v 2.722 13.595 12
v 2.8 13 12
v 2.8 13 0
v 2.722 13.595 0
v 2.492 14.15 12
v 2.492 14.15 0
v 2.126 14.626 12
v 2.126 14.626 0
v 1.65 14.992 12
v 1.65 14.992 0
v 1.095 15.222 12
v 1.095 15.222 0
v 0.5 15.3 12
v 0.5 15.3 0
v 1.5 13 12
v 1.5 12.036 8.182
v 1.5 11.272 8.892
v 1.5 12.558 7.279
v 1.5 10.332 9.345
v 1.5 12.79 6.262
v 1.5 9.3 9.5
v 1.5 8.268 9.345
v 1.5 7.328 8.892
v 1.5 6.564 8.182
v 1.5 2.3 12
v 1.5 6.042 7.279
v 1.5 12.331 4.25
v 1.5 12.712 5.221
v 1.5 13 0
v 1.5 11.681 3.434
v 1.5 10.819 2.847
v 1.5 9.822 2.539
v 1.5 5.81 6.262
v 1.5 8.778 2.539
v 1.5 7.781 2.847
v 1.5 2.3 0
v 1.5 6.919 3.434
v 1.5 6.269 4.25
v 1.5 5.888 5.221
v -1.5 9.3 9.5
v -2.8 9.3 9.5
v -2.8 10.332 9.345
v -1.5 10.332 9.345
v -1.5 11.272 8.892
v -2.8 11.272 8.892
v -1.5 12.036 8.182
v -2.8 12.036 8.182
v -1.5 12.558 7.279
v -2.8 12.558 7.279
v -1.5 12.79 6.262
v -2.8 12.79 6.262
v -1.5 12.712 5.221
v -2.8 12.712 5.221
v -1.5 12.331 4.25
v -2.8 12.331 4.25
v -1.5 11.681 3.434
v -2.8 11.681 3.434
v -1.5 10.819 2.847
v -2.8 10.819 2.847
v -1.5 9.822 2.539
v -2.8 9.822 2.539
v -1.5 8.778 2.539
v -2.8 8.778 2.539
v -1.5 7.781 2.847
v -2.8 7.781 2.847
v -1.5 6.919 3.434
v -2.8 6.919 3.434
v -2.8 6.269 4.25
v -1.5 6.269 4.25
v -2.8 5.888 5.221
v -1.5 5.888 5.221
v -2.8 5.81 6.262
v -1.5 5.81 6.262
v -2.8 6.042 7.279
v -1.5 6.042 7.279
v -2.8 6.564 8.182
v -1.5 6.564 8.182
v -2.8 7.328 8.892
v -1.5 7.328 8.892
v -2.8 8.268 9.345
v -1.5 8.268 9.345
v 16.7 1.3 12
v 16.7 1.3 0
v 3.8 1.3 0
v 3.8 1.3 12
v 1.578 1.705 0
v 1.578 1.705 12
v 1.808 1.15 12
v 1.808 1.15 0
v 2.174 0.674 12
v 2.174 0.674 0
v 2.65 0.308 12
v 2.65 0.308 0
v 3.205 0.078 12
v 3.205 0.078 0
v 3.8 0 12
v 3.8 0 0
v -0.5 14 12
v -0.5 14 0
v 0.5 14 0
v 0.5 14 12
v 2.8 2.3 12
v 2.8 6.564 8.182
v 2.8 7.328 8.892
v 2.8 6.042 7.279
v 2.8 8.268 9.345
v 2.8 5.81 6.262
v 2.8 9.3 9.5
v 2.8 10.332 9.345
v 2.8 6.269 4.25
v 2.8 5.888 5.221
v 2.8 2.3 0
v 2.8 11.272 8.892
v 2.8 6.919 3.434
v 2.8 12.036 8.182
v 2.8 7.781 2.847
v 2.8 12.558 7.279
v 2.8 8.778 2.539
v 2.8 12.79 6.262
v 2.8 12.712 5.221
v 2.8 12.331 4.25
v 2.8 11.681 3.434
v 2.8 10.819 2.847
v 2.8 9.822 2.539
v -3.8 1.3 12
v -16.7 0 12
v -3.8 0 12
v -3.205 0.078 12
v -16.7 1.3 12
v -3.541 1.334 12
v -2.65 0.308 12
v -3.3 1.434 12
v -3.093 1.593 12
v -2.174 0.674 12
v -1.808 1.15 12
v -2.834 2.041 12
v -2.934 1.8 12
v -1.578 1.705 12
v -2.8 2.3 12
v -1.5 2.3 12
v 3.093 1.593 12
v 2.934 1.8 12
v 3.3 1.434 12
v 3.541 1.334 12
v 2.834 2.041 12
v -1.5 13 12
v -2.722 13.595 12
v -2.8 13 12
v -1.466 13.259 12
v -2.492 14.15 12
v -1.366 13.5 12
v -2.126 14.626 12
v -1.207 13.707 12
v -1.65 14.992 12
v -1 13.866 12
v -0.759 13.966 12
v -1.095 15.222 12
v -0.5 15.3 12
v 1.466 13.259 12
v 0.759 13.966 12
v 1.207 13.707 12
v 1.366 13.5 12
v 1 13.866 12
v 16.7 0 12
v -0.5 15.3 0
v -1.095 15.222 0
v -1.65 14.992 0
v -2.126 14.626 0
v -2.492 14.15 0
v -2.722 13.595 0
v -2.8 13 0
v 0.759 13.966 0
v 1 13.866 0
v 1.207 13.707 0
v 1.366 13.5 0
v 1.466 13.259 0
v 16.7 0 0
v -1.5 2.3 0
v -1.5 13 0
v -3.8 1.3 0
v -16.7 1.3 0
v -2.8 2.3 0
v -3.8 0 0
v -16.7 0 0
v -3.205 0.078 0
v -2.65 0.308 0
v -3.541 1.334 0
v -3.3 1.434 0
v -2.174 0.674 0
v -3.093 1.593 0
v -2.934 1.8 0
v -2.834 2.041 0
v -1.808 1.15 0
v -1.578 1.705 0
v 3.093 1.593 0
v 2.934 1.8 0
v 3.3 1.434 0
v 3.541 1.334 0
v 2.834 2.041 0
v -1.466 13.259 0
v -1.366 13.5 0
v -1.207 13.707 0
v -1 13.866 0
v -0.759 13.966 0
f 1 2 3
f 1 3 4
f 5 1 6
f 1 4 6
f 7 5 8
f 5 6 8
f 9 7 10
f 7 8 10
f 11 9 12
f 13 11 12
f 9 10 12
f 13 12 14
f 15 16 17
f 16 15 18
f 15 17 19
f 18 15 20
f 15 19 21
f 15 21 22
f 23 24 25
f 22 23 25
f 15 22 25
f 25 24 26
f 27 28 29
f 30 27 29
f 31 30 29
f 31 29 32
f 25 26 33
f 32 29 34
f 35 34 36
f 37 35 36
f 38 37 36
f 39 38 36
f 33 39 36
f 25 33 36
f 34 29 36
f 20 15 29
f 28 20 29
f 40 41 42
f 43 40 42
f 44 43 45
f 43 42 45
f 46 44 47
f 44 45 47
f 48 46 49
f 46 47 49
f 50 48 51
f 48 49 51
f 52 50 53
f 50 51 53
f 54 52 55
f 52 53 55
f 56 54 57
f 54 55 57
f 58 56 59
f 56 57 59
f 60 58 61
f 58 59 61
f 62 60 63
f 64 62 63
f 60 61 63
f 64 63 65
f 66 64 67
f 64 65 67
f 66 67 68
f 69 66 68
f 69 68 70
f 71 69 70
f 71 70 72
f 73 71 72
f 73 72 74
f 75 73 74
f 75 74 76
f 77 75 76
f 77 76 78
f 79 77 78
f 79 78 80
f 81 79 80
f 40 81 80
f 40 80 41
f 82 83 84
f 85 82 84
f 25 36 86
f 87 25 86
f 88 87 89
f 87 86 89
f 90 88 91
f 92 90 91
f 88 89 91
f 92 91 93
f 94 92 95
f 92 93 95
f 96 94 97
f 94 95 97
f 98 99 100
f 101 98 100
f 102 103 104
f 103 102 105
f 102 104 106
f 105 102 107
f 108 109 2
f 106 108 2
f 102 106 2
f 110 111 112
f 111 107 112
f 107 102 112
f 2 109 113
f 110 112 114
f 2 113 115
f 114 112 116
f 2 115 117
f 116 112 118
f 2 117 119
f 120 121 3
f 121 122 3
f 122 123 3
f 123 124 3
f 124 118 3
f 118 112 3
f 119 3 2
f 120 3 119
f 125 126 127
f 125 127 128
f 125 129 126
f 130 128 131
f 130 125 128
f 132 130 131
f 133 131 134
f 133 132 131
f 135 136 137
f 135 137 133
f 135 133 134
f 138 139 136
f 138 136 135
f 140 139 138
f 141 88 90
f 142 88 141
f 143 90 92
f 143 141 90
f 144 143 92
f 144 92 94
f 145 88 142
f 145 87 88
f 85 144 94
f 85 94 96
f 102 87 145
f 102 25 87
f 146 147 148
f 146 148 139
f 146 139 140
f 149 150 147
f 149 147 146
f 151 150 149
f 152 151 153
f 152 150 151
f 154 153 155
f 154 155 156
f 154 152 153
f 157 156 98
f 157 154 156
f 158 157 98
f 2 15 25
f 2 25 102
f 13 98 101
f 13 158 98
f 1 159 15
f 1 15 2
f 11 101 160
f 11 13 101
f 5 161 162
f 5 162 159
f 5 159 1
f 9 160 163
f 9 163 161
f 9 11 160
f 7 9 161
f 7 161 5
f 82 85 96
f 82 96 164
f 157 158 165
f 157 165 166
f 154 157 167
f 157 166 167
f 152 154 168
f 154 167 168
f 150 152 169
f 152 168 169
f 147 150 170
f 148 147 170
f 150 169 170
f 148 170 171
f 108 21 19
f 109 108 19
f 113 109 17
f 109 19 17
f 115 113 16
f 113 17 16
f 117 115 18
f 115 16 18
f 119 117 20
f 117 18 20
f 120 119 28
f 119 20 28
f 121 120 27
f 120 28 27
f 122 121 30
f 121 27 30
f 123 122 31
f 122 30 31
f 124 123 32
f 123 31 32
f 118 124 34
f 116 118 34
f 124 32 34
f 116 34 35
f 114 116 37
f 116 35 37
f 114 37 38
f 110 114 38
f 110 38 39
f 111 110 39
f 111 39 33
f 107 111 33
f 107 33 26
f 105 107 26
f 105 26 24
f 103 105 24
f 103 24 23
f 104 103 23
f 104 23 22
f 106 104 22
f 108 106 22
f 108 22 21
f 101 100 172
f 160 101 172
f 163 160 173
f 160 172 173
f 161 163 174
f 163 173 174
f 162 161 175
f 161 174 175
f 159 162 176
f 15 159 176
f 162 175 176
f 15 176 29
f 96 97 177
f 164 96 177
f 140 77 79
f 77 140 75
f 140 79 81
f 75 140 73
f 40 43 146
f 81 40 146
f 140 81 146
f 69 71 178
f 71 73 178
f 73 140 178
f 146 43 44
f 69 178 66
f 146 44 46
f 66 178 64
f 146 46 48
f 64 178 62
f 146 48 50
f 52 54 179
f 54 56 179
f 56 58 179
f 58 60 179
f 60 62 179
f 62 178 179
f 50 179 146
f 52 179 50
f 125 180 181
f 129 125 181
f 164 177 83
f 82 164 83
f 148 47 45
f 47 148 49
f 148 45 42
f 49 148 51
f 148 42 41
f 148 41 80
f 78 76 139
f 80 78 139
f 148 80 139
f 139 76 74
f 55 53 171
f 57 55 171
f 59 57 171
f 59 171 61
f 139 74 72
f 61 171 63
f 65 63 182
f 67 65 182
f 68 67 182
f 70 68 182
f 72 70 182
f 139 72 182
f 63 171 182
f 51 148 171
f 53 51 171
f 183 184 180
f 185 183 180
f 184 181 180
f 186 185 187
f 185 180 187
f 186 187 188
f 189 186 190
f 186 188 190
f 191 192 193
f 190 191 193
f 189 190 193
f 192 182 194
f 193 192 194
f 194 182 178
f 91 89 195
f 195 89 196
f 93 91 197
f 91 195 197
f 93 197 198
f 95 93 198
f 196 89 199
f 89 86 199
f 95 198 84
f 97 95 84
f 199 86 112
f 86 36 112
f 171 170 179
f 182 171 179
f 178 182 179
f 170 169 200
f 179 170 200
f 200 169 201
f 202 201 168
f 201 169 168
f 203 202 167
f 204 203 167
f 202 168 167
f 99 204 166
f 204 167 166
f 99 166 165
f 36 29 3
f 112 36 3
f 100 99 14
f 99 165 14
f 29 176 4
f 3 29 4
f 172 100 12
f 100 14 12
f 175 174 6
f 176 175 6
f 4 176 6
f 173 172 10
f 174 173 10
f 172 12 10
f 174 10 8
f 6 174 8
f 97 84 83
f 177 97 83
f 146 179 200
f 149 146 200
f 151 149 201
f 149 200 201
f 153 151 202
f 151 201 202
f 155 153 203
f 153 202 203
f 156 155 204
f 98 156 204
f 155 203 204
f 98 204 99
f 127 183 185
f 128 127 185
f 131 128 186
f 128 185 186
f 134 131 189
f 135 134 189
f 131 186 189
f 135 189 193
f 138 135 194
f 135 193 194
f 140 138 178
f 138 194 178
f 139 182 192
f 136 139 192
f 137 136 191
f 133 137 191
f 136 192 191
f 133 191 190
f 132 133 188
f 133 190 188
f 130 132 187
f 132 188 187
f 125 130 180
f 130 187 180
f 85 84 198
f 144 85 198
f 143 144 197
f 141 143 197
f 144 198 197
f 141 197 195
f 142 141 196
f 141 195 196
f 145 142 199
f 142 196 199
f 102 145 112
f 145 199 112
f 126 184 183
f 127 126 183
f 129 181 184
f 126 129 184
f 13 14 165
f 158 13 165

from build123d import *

# Parameters (mm, degrees)
EXTRUDE_1_DEPTH       = 12
HOLE_WIZARD_7_0_7_1_D = 7


with BuildPart() as part:
    # 草图1 → 拉伸-薄壁1 (new body)
    with BuildSketch(Plane.XY):
        with BuildLine():
            Line((-16.7, 0), (-3.8, 0))
            ThreePointArc((-3.8, 0), (-2.173654403, 0.673654403), (-1.5, 2.3))
            Line((-1.5, 2.3), (-1.5, 13))
            ThreePointArc((-1.5, 13), (-1.207106781, 13.707106781), (-0.5, 14))
            Line((-0.5, 14), (0.5, 14))
            ThreePointArc((0.5, 14), (1.207106781, 13.707106781), (1.5, 13))
            Line((1.5, 13), (1.5, 2.3))
            ThreePointArc((1.5, 2.3), (2.173654403, 0.673654403), (3.8, 0))
            Line((3.8, 0), (16.7, 0))
            Line((16.7, 0), (16.7, 1.3))
            Line((16.7, 1.3), (3.8, 1.3))
            ThreePointArc((3.8, 1.3), (3.092893219, 1.592893219), (2.8, 2.3))
            Line((2.8, 2.3), (2.8, 13))
            ThreePointArc((2.8, 13), (2.126345597, 14.626345597), (0.5, 15.3))
            Line((0.5, 15.3), (-0.5, 15.3))
            ThreePointArc((-0.5, 15.3), (-2.126345597, 14.626345597), (-2.8, 13))
            Line((-2.8, 13), (-2.8, 2.3))
            ThreePointArc((-2.8, 2.3), (-3.092893219, 1.592893219), (-3.8, 1.3))
            Line((-3.8, 1.3), (-16.7, 1.3))
            Line((-16.7, 1.3), (-16.7, 0))
        make_face()
    extrude(amount=EXTRUDE_1_DEPTH)

    # Ø7.0 (7) 直径孔1 (through all)
    with Locations(Plane(origin=(2.8, 0, 0), x_dir=(0, 0, -1), z_dir=(1, 0, 0))):
        with Locations((-6, 9.3)):
            Hole(HOLE_WIZARD_7_0_7_1_D / 2)


solid = part.part
